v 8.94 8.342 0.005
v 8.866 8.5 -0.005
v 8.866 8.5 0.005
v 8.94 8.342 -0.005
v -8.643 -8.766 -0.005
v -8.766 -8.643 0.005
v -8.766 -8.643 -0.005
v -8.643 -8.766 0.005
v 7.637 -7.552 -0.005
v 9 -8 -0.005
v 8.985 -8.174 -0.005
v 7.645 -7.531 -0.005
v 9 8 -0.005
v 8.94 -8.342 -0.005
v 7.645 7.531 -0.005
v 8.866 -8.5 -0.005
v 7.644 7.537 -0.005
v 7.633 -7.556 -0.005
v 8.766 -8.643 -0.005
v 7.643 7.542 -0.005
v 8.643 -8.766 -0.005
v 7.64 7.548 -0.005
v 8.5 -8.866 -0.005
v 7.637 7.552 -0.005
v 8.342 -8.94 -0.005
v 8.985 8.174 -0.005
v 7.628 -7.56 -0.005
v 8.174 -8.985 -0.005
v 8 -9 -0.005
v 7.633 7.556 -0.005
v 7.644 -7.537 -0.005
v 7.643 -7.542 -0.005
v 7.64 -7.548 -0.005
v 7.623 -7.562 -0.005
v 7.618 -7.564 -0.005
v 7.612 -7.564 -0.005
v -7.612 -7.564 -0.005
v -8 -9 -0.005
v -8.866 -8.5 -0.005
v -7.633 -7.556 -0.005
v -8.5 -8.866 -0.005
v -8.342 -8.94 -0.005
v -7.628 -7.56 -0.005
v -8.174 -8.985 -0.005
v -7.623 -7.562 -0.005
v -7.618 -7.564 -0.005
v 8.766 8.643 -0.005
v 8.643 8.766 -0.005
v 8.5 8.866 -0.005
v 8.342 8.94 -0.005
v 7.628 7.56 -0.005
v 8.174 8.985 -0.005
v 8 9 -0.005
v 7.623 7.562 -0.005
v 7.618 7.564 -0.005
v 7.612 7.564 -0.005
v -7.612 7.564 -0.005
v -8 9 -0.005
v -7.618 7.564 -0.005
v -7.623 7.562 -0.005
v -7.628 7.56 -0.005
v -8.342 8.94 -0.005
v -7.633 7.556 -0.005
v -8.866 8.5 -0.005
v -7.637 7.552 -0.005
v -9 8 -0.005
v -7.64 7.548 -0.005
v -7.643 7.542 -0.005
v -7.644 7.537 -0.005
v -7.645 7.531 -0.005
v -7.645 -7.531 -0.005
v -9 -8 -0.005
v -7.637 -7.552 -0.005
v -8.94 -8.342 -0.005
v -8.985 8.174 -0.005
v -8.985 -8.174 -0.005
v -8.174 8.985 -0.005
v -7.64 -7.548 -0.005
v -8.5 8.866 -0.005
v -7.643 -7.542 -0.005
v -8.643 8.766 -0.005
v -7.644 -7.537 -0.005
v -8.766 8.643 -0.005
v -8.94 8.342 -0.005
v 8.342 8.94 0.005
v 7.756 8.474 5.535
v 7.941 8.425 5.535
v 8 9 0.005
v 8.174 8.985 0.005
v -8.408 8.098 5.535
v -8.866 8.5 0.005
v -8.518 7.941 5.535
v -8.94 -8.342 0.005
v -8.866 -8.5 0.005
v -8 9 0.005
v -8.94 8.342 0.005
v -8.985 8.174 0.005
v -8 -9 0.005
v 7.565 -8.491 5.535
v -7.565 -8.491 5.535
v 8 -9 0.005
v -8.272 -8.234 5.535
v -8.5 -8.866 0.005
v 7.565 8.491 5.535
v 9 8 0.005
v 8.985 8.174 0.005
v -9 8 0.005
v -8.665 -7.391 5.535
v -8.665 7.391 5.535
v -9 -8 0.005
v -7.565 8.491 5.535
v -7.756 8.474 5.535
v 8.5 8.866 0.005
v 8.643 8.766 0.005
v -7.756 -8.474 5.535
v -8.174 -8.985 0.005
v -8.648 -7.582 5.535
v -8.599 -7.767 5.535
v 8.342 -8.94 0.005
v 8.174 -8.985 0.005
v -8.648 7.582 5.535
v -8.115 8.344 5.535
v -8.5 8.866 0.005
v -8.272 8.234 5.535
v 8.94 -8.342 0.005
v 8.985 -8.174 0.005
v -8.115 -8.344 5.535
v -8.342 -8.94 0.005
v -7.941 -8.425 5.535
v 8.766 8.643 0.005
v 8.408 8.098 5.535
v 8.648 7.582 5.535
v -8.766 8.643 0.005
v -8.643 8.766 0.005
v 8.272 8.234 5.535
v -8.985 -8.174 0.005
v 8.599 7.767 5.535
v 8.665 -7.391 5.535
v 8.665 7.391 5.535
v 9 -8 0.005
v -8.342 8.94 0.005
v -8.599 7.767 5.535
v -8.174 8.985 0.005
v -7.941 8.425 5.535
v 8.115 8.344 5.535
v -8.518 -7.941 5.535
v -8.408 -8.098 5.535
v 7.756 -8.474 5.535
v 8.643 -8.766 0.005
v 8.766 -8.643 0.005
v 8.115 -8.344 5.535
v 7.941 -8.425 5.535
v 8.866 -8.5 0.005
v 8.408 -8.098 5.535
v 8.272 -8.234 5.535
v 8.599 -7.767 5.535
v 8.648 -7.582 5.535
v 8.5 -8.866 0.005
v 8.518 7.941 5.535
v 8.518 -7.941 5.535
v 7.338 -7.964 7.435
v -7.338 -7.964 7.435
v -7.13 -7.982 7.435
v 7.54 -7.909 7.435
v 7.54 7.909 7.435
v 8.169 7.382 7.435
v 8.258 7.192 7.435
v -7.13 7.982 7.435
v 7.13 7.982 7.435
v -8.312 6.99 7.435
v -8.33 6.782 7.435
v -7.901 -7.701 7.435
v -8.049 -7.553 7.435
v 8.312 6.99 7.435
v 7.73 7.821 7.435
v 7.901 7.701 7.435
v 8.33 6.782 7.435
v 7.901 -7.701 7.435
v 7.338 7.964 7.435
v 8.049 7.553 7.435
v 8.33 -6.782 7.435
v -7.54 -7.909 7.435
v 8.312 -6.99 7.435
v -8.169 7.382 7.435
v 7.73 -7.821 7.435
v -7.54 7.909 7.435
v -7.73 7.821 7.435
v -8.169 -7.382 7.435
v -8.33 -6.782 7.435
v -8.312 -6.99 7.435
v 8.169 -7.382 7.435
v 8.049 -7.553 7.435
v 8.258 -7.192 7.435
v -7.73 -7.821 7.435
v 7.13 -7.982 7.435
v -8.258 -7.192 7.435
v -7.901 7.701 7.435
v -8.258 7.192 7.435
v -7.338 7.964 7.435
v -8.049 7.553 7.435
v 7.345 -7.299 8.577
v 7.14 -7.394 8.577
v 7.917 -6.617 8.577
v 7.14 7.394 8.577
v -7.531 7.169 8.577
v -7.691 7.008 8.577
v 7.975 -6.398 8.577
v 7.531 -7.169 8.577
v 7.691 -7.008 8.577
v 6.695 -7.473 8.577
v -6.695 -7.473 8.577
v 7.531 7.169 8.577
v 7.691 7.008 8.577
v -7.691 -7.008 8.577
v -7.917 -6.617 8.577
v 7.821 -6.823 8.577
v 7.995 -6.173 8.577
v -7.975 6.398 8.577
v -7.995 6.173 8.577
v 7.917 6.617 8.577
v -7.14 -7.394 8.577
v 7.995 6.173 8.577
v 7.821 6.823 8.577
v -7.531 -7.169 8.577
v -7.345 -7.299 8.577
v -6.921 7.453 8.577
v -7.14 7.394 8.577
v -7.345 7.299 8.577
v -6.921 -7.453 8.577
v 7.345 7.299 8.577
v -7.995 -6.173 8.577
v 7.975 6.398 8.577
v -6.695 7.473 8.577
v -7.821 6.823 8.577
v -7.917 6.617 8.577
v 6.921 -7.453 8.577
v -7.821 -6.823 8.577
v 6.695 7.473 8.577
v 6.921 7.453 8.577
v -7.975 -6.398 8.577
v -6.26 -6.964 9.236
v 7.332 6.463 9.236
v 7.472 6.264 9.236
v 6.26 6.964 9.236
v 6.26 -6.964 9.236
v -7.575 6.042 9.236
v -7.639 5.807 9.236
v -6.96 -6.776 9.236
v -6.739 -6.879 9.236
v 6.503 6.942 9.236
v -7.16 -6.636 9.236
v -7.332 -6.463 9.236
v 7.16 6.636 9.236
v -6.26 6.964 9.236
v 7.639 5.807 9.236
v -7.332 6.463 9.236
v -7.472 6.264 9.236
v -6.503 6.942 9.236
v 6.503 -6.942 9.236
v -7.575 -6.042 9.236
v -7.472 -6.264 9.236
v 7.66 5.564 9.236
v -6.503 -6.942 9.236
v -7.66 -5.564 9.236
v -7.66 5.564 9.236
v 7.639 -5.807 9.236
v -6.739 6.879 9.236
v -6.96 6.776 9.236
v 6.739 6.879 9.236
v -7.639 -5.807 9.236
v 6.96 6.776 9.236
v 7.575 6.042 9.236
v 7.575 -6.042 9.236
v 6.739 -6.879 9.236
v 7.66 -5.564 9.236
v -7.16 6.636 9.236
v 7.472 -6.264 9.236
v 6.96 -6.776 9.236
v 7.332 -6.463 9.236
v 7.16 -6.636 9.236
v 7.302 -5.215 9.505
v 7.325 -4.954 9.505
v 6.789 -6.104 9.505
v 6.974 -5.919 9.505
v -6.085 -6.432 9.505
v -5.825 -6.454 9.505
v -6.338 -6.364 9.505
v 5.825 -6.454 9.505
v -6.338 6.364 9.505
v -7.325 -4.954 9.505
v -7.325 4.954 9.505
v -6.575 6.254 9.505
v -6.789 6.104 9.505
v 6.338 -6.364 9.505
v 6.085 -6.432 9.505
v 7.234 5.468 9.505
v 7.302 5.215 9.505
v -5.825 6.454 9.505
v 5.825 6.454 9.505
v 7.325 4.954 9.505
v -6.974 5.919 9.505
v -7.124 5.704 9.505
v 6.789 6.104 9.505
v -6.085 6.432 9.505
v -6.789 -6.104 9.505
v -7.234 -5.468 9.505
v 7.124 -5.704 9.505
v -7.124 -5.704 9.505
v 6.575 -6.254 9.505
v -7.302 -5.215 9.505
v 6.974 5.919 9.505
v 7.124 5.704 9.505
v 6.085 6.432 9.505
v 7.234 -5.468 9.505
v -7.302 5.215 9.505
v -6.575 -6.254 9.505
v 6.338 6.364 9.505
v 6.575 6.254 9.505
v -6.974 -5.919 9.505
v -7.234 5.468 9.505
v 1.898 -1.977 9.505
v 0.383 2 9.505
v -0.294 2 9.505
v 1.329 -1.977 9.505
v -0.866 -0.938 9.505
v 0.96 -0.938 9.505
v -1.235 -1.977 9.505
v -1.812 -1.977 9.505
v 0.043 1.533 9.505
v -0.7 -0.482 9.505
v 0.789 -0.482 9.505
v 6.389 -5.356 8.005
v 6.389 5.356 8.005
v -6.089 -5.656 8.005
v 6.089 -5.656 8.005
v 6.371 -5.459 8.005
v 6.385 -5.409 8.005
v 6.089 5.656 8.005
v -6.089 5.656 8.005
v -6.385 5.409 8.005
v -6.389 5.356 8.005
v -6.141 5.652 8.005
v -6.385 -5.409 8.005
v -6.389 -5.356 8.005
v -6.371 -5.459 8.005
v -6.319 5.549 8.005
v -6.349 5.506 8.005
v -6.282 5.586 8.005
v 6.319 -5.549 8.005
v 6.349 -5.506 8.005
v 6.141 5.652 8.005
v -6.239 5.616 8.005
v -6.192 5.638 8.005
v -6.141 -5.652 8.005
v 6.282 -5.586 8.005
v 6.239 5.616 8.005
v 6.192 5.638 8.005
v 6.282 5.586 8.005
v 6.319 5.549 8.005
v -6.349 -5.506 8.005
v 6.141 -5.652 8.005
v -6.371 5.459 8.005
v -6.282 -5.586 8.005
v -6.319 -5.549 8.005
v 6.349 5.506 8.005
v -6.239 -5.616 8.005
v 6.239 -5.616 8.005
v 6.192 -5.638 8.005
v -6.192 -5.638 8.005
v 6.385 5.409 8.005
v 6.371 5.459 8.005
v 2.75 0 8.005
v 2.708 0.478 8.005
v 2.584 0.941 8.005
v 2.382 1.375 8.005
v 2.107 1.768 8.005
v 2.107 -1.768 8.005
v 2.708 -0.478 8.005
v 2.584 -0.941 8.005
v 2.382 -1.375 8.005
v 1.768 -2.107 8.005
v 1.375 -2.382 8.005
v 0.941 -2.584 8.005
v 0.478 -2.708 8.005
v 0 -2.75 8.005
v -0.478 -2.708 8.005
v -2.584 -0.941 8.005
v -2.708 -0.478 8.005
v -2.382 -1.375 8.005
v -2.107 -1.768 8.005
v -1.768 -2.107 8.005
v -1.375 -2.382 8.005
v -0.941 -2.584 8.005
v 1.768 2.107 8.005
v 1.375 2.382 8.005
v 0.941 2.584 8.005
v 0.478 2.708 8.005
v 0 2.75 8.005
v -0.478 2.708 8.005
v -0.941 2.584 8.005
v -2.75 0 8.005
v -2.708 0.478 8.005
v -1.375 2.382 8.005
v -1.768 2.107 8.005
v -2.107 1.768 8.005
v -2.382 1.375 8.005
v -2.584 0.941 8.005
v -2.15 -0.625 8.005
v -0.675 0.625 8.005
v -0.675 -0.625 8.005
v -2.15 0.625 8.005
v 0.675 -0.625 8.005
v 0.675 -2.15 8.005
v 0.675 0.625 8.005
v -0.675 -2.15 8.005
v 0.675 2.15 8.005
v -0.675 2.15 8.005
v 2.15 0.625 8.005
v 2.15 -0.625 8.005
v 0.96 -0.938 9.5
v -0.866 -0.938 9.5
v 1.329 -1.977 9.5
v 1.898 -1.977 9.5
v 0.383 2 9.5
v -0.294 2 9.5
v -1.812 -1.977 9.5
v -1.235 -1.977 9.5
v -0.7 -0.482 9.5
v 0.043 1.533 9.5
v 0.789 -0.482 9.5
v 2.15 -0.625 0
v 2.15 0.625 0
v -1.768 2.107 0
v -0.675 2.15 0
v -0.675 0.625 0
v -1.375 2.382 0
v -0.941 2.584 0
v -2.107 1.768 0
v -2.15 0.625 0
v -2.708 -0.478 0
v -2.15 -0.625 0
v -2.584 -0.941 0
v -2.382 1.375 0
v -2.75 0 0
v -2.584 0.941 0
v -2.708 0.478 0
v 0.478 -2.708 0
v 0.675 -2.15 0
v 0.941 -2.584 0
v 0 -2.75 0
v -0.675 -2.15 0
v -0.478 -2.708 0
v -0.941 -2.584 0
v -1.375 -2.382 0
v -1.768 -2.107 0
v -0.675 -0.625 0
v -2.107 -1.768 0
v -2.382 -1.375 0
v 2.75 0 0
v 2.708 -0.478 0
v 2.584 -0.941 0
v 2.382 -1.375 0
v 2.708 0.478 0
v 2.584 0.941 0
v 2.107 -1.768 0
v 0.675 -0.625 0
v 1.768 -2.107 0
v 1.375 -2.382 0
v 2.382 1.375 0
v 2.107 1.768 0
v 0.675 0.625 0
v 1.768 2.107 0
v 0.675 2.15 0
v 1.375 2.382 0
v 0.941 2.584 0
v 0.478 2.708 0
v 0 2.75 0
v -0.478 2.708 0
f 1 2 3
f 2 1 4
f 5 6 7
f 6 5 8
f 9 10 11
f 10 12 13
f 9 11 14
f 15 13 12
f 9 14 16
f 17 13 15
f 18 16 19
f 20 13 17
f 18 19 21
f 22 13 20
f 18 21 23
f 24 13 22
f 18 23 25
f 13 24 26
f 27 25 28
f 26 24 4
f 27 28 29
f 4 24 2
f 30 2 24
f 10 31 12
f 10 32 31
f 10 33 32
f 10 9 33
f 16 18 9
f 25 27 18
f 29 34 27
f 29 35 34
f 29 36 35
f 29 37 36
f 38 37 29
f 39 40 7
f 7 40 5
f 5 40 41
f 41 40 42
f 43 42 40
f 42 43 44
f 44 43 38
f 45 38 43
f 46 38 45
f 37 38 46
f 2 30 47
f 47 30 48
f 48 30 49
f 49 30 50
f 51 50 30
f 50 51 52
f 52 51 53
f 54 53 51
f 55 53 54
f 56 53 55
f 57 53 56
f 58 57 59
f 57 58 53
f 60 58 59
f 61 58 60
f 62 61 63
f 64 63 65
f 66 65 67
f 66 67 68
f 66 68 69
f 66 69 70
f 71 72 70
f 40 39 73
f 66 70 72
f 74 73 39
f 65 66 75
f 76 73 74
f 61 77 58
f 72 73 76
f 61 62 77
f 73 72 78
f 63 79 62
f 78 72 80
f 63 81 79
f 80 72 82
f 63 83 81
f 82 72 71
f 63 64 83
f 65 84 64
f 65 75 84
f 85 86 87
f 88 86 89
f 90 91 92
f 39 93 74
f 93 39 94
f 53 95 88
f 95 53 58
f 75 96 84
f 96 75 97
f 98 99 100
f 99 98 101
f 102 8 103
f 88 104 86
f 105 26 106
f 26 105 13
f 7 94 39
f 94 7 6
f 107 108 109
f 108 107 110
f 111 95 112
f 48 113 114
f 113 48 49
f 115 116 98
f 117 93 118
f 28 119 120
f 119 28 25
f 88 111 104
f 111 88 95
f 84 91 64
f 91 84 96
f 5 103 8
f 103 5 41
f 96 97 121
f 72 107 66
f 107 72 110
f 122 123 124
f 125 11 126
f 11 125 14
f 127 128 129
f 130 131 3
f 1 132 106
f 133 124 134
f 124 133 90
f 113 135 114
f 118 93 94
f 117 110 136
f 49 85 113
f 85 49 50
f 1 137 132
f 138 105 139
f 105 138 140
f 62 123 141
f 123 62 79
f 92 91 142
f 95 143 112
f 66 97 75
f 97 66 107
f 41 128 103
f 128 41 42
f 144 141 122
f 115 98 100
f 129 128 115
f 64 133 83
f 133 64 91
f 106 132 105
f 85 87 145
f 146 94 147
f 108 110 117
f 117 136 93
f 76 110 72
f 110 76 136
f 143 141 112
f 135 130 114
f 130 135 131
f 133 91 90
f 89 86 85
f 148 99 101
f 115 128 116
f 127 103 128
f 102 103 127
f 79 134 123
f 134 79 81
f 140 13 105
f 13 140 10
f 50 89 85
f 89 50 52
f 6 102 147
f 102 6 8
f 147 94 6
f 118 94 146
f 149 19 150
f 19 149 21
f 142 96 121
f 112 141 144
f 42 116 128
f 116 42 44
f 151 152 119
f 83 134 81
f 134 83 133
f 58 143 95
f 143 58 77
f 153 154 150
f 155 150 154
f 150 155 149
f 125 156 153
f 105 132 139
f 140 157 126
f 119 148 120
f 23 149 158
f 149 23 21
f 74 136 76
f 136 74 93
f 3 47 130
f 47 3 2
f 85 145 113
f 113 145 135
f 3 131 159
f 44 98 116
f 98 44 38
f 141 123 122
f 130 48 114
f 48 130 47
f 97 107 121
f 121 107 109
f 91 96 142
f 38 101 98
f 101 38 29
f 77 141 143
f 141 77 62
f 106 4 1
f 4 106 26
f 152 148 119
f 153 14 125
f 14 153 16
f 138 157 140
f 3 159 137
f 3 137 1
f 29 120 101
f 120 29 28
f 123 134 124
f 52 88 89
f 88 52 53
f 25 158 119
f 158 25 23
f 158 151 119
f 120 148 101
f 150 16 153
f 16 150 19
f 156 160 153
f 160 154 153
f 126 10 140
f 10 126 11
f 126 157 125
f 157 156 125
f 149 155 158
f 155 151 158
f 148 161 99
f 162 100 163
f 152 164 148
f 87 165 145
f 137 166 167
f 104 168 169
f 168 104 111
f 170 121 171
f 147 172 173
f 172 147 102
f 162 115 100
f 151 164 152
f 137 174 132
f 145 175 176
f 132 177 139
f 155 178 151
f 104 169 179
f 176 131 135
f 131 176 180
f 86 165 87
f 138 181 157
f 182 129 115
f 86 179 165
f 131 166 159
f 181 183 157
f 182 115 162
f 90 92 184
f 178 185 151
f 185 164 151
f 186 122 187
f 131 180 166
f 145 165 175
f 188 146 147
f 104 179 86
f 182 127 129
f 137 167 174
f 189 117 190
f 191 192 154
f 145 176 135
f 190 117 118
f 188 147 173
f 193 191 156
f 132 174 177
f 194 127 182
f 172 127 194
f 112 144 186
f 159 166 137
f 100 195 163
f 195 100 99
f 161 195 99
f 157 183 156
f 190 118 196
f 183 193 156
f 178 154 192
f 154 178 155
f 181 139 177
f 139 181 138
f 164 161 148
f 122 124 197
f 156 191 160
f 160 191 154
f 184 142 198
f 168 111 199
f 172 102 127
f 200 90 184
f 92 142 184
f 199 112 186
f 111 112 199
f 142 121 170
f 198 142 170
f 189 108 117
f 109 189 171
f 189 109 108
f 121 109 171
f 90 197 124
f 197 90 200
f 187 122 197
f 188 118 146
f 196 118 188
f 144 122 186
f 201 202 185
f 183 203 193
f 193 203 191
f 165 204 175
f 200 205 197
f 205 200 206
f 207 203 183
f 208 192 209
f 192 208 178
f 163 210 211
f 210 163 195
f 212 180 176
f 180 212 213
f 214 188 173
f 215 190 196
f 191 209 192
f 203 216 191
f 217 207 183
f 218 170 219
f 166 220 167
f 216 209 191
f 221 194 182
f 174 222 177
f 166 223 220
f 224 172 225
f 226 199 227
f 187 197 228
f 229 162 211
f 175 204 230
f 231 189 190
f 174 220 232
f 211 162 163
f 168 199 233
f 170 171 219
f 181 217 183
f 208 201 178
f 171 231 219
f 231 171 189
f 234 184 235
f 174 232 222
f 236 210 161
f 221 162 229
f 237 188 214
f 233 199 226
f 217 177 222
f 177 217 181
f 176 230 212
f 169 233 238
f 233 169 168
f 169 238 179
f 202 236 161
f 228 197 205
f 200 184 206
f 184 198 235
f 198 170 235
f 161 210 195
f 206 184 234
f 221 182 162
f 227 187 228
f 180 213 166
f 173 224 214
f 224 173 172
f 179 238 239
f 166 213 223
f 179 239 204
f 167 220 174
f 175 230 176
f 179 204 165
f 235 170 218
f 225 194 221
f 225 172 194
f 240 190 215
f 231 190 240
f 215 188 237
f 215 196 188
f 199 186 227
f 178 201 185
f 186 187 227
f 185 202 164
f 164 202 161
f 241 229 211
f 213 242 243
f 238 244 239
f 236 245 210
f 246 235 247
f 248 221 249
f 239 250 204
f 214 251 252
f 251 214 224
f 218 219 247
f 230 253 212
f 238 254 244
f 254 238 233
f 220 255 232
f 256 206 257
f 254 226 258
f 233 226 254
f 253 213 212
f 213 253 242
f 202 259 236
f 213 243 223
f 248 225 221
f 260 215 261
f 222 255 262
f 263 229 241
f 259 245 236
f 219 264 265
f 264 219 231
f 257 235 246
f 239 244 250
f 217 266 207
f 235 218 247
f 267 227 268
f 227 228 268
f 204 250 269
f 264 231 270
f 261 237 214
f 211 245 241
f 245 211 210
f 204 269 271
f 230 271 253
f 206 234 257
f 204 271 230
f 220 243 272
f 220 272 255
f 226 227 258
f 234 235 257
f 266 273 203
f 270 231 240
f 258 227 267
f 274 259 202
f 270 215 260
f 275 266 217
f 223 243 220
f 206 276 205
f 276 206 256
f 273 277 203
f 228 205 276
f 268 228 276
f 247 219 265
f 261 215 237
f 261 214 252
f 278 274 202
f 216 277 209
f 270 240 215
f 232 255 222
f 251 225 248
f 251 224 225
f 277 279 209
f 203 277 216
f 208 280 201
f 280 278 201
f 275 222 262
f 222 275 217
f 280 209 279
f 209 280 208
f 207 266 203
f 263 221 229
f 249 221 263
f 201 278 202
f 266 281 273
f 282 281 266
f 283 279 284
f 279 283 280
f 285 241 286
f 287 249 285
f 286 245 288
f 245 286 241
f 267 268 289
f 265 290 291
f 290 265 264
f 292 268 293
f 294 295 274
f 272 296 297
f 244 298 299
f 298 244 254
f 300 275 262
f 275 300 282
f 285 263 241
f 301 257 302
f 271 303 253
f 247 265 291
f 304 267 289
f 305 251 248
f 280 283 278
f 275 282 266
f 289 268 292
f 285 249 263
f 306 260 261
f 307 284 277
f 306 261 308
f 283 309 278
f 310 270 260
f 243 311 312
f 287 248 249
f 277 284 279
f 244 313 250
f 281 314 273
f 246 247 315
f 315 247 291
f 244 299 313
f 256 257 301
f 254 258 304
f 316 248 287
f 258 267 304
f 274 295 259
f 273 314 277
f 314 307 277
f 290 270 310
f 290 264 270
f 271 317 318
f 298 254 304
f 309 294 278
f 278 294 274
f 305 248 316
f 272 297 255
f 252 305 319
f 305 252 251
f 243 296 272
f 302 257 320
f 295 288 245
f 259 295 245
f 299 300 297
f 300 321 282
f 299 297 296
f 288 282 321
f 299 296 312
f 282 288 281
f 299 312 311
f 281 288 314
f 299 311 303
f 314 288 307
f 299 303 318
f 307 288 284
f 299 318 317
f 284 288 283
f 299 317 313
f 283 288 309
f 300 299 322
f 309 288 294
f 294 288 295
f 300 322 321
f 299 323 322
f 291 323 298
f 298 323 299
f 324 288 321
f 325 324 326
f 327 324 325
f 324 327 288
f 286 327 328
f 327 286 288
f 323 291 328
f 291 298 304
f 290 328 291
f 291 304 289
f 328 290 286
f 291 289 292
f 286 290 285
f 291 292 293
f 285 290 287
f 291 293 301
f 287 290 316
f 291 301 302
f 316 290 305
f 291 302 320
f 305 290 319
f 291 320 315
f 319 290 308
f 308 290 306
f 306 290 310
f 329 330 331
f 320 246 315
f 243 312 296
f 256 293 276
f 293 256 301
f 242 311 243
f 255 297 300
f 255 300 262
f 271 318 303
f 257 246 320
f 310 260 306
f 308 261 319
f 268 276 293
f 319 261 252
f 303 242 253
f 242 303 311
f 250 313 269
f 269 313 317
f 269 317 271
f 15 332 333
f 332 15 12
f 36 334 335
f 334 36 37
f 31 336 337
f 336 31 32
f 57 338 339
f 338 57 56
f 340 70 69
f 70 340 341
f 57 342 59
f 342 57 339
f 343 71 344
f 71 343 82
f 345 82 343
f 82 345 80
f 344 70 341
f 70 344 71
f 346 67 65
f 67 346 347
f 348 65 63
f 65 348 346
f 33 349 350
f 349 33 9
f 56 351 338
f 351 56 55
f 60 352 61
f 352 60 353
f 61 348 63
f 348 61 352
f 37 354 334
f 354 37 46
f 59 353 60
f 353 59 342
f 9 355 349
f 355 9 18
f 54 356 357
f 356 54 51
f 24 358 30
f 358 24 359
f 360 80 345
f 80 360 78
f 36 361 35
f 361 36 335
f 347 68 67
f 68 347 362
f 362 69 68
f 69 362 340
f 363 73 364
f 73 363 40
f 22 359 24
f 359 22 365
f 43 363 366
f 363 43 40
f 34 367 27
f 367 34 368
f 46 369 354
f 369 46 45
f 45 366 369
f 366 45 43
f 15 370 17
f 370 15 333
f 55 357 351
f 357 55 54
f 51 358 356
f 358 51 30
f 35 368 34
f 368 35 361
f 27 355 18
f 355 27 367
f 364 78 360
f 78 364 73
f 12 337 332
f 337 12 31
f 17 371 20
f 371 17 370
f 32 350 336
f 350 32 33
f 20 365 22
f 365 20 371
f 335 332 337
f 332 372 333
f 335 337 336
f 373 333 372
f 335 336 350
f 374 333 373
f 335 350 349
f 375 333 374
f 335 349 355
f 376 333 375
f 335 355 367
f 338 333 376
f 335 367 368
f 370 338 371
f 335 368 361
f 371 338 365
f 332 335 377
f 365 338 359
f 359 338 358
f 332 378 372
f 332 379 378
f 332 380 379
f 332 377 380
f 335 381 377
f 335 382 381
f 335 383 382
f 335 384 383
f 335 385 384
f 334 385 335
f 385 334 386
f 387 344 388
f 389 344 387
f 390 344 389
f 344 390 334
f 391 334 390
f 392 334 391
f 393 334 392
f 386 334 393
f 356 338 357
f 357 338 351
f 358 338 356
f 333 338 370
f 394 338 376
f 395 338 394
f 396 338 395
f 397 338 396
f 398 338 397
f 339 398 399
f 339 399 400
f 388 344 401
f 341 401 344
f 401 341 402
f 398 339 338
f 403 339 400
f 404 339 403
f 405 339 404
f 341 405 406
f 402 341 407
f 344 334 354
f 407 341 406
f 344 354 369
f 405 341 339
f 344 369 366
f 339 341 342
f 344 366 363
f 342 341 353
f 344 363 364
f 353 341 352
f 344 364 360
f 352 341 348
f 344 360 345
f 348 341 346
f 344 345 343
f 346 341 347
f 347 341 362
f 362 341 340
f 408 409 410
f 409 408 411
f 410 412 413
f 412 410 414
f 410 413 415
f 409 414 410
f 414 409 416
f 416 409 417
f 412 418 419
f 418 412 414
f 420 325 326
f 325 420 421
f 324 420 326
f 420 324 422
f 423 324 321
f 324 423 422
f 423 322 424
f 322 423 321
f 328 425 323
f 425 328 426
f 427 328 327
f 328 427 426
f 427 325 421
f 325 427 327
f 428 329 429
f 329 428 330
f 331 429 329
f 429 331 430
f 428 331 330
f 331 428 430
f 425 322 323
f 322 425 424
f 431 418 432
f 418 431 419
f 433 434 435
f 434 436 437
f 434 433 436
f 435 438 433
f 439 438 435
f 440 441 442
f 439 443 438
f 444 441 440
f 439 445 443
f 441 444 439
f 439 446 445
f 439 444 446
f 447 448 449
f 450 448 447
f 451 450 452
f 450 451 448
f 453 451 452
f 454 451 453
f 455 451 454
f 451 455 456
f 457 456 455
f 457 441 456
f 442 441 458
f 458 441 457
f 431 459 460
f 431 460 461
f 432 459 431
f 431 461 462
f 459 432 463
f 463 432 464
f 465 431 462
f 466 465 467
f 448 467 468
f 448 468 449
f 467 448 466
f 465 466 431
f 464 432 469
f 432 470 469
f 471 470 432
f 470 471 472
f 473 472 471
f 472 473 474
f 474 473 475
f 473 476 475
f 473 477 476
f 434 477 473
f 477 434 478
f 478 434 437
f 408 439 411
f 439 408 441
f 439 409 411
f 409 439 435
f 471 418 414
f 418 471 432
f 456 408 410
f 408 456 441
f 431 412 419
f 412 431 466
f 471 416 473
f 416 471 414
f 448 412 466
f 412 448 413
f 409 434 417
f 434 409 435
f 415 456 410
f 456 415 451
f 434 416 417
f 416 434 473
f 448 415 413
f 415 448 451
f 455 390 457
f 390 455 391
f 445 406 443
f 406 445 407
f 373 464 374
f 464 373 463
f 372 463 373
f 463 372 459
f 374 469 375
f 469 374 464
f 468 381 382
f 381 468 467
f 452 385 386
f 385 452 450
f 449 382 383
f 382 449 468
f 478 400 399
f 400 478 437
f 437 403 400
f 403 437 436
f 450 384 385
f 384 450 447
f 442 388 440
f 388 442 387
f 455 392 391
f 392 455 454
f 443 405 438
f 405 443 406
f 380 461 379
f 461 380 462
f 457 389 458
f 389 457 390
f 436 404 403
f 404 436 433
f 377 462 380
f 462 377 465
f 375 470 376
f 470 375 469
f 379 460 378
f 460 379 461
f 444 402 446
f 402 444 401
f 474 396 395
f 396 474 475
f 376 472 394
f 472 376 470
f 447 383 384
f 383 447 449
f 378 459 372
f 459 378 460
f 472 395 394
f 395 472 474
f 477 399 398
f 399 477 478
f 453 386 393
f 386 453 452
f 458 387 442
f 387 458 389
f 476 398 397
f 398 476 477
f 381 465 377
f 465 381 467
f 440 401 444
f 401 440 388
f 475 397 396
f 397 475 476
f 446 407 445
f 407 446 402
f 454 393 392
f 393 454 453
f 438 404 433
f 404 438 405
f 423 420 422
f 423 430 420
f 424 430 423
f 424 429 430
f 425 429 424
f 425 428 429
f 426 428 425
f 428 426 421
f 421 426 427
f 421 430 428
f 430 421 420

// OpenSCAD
export_target = "preview";
include <common/custom-shell-params.scad>

user_top_scale = 0.75;
user_keycap_shoulder_radius = 1.6;

include <../base/keycap.scad>
